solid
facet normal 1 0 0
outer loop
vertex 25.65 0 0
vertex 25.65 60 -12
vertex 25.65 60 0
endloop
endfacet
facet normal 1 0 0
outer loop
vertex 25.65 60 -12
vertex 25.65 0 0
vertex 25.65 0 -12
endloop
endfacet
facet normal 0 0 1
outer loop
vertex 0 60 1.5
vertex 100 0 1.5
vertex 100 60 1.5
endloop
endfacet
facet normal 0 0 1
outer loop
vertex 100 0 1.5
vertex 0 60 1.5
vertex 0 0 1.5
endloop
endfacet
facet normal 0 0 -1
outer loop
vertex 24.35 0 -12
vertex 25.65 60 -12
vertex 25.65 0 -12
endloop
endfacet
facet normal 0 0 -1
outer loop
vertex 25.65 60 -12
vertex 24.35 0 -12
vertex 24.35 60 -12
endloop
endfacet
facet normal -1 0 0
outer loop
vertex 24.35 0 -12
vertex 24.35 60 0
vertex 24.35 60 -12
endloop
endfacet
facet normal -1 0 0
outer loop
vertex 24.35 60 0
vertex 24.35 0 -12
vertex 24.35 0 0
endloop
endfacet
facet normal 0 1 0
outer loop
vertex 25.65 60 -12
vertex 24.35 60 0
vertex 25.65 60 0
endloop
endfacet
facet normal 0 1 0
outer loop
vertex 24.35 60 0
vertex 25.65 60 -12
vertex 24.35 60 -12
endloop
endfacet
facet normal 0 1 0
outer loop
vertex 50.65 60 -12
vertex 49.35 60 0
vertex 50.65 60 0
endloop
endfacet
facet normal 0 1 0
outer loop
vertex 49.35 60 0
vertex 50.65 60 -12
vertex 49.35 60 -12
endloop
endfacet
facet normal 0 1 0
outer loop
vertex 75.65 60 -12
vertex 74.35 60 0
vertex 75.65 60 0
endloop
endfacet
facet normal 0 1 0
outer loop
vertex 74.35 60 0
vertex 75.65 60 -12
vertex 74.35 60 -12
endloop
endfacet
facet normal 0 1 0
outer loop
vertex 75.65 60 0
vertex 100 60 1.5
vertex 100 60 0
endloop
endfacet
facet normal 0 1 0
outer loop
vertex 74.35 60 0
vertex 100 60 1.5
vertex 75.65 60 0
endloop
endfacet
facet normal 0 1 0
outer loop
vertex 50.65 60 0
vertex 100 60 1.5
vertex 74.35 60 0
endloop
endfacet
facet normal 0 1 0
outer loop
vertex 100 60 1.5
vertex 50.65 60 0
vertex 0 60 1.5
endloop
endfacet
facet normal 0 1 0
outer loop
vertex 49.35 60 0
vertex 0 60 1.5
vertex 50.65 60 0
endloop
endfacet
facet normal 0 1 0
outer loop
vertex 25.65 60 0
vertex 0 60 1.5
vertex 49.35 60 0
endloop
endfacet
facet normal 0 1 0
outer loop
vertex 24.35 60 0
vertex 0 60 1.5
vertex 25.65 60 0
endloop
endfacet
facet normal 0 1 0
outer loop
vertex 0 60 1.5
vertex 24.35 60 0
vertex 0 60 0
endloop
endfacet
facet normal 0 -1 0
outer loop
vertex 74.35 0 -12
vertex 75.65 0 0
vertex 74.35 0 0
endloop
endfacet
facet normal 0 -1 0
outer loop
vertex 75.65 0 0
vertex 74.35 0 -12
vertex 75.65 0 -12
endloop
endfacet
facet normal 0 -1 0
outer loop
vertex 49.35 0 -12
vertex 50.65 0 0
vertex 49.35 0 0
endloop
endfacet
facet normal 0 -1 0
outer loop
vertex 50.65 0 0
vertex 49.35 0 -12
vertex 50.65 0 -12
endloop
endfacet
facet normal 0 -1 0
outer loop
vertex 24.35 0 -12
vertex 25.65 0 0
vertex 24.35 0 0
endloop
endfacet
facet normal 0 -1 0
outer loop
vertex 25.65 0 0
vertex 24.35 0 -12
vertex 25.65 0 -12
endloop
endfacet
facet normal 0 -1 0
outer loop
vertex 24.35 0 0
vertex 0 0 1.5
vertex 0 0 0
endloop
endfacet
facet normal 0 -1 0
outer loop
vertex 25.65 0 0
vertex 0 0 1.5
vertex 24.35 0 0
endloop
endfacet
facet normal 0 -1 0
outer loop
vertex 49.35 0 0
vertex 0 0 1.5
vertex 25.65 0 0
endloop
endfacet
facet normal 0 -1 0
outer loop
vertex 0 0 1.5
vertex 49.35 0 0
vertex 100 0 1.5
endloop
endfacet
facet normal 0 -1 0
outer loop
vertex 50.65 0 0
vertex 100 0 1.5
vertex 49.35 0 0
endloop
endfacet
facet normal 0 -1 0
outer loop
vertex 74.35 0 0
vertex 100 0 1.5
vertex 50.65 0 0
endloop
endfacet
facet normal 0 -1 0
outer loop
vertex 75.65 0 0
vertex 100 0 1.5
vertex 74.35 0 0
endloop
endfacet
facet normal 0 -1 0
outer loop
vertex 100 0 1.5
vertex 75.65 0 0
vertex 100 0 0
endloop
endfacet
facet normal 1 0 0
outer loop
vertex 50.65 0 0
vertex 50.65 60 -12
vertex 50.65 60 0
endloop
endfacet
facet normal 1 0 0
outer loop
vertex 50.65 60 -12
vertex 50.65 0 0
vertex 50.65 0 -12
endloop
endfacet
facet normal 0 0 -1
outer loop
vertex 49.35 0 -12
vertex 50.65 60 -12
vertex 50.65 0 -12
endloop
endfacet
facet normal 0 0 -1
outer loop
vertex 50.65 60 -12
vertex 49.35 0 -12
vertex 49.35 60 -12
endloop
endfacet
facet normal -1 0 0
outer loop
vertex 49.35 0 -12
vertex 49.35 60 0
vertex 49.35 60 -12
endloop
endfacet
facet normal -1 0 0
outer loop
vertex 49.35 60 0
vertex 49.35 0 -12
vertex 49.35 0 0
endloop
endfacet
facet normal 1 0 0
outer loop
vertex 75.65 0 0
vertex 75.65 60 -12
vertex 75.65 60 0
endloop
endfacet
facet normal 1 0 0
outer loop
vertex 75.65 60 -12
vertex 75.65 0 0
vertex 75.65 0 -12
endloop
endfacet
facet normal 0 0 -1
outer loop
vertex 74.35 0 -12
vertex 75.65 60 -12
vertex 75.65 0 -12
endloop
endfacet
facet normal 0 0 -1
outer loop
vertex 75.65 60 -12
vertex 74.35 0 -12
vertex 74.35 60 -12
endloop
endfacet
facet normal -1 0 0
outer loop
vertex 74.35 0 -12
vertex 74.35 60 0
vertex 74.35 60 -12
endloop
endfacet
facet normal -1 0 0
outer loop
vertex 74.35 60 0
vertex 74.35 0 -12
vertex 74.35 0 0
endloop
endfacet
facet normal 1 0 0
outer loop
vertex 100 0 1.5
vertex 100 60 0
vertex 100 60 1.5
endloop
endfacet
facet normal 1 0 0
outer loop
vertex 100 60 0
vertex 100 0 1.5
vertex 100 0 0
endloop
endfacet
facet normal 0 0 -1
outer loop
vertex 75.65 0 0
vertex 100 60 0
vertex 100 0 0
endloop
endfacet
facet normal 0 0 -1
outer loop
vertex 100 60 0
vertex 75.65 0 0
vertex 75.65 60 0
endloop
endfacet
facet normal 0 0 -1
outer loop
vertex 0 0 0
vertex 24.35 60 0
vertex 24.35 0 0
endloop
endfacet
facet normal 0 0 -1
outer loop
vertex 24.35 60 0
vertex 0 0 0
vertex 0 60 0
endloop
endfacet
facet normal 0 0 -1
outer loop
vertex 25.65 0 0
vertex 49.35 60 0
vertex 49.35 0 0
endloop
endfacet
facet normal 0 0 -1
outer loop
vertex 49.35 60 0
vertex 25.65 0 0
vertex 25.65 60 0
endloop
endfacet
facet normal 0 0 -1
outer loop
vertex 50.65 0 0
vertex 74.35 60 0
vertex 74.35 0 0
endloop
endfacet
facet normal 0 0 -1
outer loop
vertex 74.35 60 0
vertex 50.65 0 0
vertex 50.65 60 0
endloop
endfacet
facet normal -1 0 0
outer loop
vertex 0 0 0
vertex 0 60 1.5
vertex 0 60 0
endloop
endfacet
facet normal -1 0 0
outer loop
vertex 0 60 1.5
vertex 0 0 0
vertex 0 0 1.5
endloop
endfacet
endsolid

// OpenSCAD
$fn = 32;

// ----------------------------------------------------------------------
// Ribbed panel: 1.5 mm panel
// ----------------------------------------------------------------------

// --- parameters (mm) ---
panel_l = 100;            // panel length, X
panel_w = 60;             // panel width, Y
panel_t = 1.5;            // panel thickness, Z
rib_t = 1.3;              // rib thickness
rib_h = 12;               // rib height below the panel
ribs = 3;                 // number of ribs

total_h = panel_t + rib_h;  // overall height

union() {
  cube([panel_l, panel_w, panel_t]);
  for (i = [1 : ribs])
    translate([i * panel_l / (ribs + 1) - rib_t / 2, 0, -rib_h])
      cube([rib_t, panel_w, rib_h + panel_t]);
}
